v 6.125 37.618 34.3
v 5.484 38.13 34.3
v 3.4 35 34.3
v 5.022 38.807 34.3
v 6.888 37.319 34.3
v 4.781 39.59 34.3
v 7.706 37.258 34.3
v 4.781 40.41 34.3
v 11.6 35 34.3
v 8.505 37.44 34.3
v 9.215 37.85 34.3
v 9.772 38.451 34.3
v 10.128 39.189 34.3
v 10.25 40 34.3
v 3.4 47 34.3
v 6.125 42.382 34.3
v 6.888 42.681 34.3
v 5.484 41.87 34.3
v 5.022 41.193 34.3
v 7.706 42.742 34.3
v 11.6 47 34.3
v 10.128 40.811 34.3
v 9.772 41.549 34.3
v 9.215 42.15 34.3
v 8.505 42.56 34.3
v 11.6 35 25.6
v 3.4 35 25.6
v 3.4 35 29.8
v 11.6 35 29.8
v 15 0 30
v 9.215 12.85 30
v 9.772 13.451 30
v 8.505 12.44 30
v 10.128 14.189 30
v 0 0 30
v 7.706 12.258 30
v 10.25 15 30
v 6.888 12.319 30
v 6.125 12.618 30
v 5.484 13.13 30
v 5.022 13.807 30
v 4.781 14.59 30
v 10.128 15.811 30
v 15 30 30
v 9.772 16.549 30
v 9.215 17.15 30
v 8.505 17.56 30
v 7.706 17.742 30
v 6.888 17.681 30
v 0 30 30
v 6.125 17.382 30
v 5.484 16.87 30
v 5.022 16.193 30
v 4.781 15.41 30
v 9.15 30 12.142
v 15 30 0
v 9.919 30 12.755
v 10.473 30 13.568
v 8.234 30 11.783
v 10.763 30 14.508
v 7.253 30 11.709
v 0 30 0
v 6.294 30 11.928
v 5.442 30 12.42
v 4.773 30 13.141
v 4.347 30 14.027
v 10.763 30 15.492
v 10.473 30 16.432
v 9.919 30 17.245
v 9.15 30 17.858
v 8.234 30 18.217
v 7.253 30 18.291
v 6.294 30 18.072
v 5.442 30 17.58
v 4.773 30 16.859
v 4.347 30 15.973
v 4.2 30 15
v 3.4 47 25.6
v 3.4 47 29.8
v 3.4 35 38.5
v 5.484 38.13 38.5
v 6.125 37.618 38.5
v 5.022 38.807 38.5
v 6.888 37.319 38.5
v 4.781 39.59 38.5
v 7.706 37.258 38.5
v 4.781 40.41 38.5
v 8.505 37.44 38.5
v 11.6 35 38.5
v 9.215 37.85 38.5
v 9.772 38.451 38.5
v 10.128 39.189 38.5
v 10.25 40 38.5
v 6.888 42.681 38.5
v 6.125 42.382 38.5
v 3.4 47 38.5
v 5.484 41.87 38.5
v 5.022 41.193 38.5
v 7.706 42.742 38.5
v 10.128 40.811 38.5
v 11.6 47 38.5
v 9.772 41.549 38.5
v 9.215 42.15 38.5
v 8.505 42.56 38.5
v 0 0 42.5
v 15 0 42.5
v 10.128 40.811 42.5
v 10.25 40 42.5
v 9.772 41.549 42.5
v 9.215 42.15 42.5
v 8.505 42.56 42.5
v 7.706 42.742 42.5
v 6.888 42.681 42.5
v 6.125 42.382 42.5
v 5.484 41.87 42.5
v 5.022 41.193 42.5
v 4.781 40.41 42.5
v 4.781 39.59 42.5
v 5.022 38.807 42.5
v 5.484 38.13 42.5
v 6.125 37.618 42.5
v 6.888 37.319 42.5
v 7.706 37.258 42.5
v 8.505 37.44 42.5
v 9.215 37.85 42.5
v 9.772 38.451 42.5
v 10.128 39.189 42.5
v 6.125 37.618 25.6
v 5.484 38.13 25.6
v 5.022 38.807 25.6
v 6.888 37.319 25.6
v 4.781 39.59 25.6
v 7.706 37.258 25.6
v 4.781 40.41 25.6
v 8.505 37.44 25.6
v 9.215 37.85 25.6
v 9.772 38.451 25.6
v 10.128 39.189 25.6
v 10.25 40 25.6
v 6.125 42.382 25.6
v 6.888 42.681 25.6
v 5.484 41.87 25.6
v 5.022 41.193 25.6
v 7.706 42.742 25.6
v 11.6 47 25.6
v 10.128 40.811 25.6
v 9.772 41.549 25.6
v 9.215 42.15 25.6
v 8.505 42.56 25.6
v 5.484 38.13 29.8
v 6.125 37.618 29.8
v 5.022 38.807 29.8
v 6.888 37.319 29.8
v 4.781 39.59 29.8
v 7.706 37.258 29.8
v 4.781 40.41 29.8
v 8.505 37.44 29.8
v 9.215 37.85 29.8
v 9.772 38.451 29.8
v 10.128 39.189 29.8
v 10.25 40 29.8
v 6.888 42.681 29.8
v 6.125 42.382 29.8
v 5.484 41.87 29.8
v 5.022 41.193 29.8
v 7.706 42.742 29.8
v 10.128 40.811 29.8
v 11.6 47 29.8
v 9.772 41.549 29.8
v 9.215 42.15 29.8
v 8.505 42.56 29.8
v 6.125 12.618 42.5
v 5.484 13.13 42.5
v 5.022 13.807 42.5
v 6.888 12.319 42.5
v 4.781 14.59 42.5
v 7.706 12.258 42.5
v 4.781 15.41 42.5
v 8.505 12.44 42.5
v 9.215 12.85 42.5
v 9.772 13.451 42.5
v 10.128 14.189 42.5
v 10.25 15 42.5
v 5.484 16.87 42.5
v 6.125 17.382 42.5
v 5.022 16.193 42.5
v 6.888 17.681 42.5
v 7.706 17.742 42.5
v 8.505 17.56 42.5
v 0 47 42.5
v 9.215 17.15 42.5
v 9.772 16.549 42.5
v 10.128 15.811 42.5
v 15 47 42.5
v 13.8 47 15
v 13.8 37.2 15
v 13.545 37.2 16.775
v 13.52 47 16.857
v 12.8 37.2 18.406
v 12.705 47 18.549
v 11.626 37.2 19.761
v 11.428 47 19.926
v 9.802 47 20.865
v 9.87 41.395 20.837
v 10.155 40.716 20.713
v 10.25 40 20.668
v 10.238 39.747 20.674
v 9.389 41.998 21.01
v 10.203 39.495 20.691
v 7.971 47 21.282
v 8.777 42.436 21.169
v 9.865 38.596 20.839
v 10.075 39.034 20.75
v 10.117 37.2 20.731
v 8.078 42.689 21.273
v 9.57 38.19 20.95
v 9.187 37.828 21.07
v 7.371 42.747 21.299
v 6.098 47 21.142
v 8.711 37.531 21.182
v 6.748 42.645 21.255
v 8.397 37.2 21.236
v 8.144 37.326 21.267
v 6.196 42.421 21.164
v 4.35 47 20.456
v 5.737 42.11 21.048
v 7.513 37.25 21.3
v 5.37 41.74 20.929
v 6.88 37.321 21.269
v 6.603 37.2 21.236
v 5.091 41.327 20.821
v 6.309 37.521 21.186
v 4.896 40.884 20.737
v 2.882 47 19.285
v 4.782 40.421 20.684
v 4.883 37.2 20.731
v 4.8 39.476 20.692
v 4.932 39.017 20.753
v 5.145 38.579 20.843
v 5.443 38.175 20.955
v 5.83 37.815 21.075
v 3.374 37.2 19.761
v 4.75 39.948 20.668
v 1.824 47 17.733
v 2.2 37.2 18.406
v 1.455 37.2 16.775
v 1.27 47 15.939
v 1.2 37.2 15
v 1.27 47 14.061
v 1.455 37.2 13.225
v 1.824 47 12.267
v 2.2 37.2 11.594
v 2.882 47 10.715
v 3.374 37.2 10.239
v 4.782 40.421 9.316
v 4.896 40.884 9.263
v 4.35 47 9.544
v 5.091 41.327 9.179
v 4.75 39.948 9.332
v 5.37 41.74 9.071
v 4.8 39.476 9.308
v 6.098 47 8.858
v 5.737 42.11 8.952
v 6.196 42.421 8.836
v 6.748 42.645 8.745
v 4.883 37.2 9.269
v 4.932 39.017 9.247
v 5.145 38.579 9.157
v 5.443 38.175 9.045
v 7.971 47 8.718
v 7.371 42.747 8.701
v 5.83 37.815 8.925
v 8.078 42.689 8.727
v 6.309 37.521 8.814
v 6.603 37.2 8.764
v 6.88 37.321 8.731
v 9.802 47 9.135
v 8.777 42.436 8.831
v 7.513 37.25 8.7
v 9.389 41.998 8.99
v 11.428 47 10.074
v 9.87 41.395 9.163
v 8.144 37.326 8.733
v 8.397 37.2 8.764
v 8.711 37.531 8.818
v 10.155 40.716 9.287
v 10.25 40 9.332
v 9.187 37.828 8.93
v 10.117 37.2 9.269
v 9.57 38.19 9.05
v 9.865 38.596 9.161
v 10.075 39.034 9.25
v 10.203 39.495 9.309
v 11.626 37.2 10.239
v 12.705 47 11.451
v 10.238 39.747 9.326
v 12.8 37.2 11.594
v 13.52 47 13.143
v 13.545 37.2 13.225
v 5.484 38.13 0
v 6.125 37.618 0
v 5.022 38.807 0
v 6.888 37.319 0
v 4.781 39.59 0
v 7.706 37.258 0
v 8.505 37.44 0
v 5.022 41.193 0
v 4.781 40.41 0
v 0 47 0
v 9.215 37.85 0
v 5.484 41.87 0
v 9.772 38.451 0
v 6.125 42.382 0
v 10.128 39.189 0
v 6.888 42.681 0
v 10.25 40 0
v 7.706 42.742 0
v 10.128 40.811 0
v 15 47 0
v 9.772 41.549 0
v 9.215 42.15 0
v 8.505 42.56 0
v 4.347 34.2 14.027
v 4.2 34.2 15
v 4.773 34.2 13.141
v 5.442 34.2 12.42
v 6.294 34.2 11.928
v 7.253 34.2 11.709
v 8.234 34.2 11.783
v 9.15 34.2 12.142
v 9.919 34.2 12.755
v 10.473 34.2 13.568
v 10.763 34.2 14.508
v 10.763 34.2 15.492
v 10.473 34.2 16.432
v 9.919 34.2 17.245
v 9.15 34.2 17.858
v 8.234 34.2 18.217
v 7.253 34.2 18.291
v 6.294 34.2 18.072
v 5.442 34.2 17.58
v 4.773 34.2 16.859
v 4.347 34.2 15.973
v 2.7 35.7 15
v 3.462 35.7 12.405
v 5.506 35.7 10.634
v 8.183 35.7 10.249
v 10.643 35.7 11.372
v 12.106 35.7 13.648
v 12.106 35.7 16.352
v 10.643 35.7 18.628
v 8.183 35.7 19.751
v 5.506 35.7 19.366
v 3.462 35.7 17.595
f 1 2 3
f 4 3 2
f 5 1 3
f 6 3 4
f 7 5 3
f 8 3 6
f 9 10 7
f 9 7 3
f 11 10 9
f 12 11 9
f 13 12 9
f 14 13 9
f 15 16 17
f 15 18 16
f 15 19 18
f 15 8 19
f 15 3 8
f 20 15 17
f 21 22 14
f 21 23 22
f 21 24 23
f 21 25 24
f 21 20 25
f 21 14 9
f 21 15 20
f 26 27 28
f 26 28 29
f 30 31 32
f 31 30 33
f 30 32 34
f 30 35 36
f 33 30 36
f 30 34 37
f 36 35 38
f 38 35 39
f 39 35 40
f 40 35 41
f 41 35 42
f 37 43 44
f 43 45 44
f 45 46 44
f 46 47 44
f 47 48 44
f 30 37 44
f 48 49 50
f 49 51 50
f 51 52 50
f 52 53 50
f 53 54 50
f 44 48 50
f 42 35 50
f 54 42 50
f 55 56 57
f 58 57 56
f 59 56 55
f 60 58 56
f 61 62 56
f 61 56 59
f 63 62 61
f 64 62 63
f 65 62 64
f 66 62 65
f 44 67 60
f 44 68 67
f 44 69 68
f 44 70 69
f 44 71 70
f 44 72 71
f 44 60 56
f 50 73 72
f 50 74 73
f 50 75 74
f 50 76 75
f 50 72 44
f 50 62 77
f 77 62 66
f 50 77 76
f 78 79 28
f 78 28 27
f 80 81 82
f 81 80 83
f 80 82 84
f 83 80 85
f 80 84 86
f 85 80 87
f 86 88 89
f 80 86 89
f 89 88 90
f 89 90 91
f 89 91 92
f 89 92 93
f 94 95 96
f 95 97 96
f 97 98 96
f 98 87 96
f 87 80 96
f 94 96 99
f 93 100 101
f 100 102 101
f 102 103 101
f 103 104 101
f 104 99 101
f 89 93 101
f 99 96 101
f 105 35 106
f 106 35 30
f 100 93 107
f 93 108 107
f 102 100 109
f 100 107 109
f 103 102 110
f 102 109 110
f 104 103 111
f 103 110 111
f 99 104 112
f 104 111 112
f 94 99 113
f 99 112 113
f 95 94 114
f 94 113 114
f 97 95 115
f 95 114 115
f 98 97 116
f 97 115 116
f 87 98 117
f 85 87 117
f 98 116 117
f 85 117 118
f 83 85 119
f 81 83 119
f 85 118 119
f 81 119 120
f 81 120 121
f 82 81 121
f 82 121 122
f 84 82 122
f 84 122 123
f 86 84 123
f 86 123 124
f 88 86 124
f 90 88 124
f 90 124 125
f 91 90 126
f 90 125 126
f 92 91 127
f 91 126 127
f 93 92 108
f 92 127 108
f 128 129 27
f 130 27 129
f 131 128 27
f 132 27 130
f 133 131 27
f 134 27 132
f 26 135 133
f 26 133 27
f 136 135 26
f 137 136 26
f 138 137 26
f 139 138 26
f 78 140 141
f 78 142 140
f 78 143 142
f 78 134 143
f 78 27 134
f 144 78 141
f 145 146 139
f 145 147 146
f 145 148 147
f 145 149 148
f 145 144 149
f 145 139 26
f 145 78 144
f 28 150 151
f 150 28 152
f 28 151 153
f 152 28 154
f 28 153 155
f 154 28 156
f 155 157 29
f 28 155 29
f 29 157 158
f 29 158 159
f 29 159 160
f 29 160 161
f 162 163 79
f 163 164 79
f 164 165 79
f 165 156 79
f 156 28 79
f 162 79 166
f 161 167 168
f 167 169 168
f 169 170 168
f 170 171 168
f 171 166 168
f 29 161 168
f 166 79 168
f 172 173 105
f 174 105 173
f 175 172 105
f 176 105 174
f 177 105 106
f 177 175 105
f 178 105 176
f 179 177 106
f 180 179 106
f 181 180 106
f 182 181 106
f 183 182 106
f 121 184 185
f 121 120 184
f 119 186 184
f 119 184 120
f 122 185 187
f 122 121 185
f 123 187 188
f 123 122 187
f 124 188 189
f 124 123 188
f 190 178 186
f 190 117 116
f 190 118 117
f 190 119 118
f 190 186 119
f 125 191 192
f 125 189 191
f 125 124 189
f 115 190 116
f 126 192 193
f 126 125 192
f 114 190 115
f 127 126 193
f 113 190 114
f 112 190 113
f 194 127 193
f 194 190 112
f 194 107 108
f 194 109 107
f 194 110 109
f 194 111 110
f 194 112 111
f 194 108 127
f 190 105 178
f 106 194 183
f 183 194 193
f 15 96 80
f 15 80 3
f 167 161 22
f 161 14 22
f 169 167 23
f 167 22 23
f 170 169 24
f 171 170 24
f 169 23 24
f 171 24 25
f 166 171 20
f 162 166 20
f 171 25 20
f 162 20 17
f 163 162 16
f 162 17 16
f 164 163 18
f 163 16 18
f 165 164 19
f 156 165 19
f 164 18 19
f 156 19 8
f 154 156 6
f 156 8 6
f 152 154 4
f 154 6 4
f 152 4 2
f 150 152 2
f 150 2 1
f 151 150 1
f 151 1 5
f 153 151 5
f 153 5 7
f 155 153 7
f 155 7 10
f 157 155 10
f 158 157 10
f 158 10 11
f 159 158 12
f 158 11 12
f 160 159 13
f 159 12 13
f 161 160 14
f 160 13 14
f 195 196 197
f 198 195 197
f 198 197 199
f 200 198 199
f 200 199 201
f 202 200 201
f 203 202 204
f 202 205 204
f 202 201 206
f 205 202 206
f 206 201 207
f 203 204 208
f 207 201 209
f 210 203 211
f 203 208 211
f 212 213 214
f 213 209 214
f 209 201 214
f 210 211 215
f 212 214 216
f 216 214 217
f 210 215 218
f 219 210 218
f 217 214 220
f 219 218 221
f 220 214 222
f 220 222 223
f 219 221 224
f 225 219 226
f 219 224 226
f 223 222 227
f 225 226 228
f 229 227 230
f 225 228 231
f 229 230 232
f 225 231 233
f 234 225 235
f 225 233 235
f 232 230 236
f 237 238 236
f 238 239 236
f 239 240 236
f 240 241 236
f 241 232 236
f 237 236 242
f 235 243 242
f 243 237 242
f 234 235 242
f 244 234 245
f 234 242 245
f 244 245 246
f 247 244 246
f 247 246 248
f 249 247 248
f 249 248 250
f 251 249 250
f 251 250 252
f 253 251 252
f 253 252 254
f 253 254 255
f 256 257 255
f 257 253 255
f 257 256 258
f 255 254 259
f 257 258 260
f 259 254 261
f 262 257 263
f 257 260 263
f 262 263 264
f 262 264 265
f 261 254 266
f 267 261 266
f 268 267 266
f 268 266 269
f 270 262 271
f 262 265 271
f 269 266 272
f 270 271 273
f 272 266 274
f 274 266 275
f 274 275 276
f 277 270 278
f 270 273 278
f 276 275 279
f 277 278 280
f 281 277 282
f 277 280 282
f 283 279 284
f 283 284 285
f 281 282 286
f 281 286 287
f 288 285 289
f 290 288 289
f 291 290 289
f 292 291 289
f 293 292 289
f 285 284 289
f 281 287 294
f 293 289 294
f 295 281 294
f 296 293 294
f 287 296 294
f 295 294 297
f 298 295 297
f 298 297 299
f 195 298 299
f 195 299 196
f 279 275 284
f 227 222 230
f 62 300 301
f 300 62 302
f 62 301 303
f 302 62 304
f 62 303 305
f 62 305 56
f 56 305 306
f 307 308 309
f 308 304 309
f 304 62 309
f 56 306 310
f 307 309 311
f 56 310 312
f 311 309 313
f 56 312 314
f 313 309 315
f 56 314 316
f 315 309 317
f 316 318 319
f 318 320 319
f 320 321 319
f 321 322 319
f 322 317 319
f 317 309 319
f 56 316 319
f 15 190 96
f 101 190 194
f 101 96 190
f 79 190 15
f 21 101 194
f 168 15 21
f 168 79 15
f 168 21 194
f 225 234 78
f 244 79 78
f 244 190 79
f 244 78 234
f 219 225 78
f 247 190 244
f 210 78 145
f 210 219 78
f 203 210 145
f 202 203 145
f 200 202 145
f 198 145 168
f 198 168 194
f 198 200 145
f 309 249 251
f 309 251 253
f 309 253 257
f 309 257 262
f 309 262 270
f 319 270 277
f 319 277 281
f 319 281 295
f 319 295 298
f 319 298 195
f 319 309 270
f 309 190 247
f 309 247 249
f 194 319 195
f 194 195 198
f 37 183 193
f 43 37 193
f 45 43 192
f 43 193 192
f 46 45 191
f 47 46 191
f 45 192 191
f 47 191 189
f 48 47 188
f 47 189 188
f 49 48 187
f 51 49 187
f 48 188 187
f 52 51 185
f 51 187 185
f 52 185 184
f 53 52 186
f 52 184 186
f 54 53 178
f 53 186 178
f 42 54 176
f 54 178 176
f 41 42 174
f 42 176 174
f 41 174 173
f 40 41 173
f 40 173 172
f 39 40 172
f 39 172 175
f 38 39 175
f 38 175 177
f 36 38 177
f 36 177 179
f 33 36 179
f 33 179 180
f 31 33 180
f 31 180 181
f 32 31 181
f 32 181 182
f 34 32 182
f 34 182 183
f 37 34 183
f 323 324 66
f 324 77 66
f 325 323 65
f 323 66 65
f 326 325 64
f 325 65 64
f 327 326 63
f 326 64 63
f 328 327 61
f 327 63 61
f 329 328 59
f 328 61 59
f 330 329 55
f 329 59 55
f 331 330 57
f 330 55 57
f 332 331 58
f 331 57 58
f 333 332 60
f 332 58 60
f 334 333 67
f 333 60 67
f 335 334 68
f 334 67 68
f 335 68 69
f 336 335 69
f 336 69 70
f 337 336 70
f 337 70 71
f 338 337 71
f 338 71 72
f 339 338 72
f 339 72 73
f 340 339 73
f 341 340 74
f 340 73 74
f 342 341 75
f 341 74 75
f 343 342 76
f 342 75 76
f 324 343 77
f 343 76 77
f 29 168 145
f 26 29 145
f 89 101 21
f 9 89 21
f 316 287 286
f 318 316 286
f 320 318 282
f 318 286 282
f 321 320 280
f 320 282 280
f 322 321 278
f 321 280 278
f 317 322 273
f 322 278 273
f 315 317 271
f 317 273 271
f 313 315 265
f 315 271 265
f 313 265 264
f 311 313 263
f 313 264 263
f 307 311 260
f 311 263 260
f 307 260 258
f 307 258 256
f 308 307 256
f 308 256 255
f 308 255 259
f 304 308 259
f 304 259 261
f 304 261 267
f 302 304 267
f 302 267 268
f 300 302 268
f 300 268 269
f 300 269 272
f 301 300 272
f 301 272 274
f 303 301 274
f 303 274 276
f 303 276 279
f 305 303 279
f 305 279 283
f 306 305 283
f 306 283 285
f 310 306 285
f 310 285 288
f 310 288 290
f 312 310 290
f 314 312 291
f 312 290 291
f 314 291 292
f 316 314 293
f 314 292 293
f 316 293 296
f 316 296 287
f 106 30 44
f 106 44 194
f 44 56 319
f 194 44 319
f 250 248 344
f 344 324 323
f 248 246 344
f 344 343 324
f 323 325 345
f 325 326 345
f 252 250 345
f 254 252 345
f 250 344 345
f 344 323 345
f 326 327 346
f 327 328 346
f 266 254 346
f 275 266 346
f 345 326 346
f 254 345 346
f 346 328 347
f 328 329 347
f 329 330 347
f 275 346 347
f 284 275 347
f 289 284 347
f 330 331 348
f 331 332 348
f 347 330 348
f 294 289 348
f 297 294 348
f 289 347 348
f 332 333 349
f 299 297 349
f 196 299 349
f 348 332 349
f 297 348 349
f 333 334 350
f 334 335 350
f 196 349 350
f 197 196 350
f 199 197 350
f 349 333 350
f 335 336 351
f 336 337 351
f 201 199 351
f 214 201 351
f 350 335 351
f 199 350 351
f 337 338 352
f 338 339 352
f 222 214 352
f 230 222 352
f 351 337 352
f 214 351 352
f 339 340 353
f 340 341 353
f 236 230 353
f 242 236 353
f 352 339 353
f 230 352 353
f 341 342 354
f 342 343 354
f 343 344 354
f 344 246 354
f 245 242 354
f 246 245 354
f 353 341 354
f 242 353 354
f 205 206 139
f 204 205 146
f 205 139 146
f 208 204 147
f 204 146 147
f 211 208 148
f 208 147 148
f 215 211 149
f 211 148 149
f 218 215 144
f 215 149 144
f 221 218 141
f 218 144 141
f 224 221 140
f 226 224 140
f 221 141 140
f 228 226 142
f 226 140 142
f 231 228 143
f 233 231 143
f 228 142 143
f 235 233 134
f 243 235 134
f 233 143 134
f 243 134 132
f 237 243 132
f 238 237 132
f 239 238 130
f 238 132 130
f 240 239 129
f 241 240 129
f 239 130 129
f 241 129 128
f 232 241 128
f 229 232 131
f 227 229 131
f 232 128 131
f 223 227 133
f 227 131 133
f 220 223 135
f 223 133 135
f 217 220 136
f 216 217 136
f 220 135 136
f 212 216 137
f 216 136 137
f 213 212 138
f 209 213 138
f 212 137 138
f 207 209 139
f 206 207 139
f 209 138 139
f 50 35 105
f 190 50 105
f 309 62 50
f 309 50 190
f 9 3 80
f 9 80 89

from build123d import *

# Parameters (mm, degrees)
SKETCH1_W                                       = 15
SKETCH1_H                                       = 47
BOSS_EXTRUDE1_DEPTH                             = 42.5
SKETCH2_W                                       = 30
SKETCH2_H                                       = 30
CUT_EXTRUDE1_DEPTH                              = 16
SKETCH3_R                                       = 2.75
CUT_EXTRUDE2_DEPTH                              = 15
CUT_EXTRUDE3_REACH                              = 49
SKETCH4_R                                       = 3.25
SKETCH5_R                                       = 2.75
CUT_EXTRUDE4_DEPTH                              = 28.5
CUT_EXTRUDE6_START                              = -7.2
SKETCH6_R                                       = 6.3
CUT_EXTRUDE6_DEPTH                              = 15
CSK_FOR_M6_FLAT_HEAD_MACHINE_SCREW1_D           = 6.6
CSK_FOR_M6_FLAT_HEAD_MACHINE_SCREW1_CSINK_D     = 12.6
CSK_FOR_M6_FLAT_HEAD_MACHINE_SCREW1_CSINK_ANGLE = 90
SKETCH10_W                                      = 8.2
SKETCH10_H                                      = 4.2
CUT_EXTRUDE7_DEPTH                              = 12


with BuildPart() as part:
    # Sketch1 → Boss-Extrude1 (new body)
    with BuildSketch(Plane.XY):
        with Locations((7.5, 23.5)):
            Rectangle(SKETCH1_W, SKETCH1_H)
    extrude(amount=BOSS_EXTRUDE1_DEPTH)

    # Sketch2 → Cut-Extrude1 (cut, through all)
    with BuildSketch(Plane.ZY):
        with Locations((15, 15)):
            Rectangle(SKETCH2_W, SKETCH2_H)
    extrude(amount=-CUT_EXTRUDE1_DEPTH, mode=Mode.SUBTRACT)

    # Sketch3 → Cut-Extrude2 (cut)
    with BuildSketch(Plane.XY.offset(42.5)):
        with Locations((7.5, 15)):
            Circle(SKETCH3_R)
        with Locations((7.5, 40)):
            Circle(SKETCH3_R)
    extrude(amount=-CUT_EXTRUDE2_DEPTH, mode=Mode.SUBTRACT)

    # Sketch4 → Cut-Extrude3 (cut, up to next)
    with BuildSketch(Plane(origin=(0, 47, 0), x_dir=(1, 0, 0), z_dir=(0, 1, 0)), mode=Mode.PRIVATE) as cut_extrude3_sk1:
        with Locations((7.5, -15)):
            Circle(SKETCH4_R)
    cut_extrude3_tool1 = extrude(cut_extrude3_sk1.sketch, amount=-CUT_EXTRUDE3_REACH, mode=Mode.PRIVATE) & part.part
    add(cut_extrude3_tool1.solids().sort_by_distance((7.5, 47, 15))[0], mode=Mode.SUBTRACT)

    # Sketch5 → Cut-Extrude4 (cut, through all)
    with BuildSketch(Plane.XY.offset(27.5)):
        with Locations((7.5, 40)):
            Circle(SKETCH5_R)
    extrude(amount=-CUT_EXTRUDE4_DEPTH, mode=Mode.SUBTRACT)

    # Sketch6 → Cut-Extrude6 (cut)
    with BuildSketch(Plane.XZ.offset(-30).offset(CUT_EXTRUDE6_START)):
        with Locations((7.5, 15)):
            Circle(SKETCH6_R)
    extrude(amount=-CUT_EXTRUDE6_DEPTH, mode=Mode.SUBTRACT)

    # CSK for M6 Flat Head Machine Screw1 (through all)
    with Locations(Plane(origin=(0, 37.2, 0), x_dir=(1, 0, 0), z_dir=(0, 1, 0))):
        with Locations((7.5, -15)):
            CounterSinkHole(CSK_FOR_M6_FLAT_HEAD_MACHINE_SCREW1_D / 2, CSK_FOR_M6_FLAT_HEAD_MACHINE_SCREW1_CSINK_D / 2, counter_sink_angle=CSK_FOR_M6_FLAT_HEAD_MACHINE_SCREW1_CSINK_ANGLE)

    # Sketch10 → Cut-Extrude7 (cut)
    with BuildSketch(Plane(origin=(0, 47, 0), x_dir=(1, 0, 0), z_dir=(0, 1, 0))):
        with Locations((7.5, -36.4)):
            Rectangle(SKETCH10_W, SKETCH10_H)
        with Locations((7.5, -27.7)):
            Rectangle(SKETCH10_W, SKETCH10_H)
    extrude(amount=-CUT_EXTRUDE7_DEPTH, mode=Mode.SUBTRACT)


solid = part.part
